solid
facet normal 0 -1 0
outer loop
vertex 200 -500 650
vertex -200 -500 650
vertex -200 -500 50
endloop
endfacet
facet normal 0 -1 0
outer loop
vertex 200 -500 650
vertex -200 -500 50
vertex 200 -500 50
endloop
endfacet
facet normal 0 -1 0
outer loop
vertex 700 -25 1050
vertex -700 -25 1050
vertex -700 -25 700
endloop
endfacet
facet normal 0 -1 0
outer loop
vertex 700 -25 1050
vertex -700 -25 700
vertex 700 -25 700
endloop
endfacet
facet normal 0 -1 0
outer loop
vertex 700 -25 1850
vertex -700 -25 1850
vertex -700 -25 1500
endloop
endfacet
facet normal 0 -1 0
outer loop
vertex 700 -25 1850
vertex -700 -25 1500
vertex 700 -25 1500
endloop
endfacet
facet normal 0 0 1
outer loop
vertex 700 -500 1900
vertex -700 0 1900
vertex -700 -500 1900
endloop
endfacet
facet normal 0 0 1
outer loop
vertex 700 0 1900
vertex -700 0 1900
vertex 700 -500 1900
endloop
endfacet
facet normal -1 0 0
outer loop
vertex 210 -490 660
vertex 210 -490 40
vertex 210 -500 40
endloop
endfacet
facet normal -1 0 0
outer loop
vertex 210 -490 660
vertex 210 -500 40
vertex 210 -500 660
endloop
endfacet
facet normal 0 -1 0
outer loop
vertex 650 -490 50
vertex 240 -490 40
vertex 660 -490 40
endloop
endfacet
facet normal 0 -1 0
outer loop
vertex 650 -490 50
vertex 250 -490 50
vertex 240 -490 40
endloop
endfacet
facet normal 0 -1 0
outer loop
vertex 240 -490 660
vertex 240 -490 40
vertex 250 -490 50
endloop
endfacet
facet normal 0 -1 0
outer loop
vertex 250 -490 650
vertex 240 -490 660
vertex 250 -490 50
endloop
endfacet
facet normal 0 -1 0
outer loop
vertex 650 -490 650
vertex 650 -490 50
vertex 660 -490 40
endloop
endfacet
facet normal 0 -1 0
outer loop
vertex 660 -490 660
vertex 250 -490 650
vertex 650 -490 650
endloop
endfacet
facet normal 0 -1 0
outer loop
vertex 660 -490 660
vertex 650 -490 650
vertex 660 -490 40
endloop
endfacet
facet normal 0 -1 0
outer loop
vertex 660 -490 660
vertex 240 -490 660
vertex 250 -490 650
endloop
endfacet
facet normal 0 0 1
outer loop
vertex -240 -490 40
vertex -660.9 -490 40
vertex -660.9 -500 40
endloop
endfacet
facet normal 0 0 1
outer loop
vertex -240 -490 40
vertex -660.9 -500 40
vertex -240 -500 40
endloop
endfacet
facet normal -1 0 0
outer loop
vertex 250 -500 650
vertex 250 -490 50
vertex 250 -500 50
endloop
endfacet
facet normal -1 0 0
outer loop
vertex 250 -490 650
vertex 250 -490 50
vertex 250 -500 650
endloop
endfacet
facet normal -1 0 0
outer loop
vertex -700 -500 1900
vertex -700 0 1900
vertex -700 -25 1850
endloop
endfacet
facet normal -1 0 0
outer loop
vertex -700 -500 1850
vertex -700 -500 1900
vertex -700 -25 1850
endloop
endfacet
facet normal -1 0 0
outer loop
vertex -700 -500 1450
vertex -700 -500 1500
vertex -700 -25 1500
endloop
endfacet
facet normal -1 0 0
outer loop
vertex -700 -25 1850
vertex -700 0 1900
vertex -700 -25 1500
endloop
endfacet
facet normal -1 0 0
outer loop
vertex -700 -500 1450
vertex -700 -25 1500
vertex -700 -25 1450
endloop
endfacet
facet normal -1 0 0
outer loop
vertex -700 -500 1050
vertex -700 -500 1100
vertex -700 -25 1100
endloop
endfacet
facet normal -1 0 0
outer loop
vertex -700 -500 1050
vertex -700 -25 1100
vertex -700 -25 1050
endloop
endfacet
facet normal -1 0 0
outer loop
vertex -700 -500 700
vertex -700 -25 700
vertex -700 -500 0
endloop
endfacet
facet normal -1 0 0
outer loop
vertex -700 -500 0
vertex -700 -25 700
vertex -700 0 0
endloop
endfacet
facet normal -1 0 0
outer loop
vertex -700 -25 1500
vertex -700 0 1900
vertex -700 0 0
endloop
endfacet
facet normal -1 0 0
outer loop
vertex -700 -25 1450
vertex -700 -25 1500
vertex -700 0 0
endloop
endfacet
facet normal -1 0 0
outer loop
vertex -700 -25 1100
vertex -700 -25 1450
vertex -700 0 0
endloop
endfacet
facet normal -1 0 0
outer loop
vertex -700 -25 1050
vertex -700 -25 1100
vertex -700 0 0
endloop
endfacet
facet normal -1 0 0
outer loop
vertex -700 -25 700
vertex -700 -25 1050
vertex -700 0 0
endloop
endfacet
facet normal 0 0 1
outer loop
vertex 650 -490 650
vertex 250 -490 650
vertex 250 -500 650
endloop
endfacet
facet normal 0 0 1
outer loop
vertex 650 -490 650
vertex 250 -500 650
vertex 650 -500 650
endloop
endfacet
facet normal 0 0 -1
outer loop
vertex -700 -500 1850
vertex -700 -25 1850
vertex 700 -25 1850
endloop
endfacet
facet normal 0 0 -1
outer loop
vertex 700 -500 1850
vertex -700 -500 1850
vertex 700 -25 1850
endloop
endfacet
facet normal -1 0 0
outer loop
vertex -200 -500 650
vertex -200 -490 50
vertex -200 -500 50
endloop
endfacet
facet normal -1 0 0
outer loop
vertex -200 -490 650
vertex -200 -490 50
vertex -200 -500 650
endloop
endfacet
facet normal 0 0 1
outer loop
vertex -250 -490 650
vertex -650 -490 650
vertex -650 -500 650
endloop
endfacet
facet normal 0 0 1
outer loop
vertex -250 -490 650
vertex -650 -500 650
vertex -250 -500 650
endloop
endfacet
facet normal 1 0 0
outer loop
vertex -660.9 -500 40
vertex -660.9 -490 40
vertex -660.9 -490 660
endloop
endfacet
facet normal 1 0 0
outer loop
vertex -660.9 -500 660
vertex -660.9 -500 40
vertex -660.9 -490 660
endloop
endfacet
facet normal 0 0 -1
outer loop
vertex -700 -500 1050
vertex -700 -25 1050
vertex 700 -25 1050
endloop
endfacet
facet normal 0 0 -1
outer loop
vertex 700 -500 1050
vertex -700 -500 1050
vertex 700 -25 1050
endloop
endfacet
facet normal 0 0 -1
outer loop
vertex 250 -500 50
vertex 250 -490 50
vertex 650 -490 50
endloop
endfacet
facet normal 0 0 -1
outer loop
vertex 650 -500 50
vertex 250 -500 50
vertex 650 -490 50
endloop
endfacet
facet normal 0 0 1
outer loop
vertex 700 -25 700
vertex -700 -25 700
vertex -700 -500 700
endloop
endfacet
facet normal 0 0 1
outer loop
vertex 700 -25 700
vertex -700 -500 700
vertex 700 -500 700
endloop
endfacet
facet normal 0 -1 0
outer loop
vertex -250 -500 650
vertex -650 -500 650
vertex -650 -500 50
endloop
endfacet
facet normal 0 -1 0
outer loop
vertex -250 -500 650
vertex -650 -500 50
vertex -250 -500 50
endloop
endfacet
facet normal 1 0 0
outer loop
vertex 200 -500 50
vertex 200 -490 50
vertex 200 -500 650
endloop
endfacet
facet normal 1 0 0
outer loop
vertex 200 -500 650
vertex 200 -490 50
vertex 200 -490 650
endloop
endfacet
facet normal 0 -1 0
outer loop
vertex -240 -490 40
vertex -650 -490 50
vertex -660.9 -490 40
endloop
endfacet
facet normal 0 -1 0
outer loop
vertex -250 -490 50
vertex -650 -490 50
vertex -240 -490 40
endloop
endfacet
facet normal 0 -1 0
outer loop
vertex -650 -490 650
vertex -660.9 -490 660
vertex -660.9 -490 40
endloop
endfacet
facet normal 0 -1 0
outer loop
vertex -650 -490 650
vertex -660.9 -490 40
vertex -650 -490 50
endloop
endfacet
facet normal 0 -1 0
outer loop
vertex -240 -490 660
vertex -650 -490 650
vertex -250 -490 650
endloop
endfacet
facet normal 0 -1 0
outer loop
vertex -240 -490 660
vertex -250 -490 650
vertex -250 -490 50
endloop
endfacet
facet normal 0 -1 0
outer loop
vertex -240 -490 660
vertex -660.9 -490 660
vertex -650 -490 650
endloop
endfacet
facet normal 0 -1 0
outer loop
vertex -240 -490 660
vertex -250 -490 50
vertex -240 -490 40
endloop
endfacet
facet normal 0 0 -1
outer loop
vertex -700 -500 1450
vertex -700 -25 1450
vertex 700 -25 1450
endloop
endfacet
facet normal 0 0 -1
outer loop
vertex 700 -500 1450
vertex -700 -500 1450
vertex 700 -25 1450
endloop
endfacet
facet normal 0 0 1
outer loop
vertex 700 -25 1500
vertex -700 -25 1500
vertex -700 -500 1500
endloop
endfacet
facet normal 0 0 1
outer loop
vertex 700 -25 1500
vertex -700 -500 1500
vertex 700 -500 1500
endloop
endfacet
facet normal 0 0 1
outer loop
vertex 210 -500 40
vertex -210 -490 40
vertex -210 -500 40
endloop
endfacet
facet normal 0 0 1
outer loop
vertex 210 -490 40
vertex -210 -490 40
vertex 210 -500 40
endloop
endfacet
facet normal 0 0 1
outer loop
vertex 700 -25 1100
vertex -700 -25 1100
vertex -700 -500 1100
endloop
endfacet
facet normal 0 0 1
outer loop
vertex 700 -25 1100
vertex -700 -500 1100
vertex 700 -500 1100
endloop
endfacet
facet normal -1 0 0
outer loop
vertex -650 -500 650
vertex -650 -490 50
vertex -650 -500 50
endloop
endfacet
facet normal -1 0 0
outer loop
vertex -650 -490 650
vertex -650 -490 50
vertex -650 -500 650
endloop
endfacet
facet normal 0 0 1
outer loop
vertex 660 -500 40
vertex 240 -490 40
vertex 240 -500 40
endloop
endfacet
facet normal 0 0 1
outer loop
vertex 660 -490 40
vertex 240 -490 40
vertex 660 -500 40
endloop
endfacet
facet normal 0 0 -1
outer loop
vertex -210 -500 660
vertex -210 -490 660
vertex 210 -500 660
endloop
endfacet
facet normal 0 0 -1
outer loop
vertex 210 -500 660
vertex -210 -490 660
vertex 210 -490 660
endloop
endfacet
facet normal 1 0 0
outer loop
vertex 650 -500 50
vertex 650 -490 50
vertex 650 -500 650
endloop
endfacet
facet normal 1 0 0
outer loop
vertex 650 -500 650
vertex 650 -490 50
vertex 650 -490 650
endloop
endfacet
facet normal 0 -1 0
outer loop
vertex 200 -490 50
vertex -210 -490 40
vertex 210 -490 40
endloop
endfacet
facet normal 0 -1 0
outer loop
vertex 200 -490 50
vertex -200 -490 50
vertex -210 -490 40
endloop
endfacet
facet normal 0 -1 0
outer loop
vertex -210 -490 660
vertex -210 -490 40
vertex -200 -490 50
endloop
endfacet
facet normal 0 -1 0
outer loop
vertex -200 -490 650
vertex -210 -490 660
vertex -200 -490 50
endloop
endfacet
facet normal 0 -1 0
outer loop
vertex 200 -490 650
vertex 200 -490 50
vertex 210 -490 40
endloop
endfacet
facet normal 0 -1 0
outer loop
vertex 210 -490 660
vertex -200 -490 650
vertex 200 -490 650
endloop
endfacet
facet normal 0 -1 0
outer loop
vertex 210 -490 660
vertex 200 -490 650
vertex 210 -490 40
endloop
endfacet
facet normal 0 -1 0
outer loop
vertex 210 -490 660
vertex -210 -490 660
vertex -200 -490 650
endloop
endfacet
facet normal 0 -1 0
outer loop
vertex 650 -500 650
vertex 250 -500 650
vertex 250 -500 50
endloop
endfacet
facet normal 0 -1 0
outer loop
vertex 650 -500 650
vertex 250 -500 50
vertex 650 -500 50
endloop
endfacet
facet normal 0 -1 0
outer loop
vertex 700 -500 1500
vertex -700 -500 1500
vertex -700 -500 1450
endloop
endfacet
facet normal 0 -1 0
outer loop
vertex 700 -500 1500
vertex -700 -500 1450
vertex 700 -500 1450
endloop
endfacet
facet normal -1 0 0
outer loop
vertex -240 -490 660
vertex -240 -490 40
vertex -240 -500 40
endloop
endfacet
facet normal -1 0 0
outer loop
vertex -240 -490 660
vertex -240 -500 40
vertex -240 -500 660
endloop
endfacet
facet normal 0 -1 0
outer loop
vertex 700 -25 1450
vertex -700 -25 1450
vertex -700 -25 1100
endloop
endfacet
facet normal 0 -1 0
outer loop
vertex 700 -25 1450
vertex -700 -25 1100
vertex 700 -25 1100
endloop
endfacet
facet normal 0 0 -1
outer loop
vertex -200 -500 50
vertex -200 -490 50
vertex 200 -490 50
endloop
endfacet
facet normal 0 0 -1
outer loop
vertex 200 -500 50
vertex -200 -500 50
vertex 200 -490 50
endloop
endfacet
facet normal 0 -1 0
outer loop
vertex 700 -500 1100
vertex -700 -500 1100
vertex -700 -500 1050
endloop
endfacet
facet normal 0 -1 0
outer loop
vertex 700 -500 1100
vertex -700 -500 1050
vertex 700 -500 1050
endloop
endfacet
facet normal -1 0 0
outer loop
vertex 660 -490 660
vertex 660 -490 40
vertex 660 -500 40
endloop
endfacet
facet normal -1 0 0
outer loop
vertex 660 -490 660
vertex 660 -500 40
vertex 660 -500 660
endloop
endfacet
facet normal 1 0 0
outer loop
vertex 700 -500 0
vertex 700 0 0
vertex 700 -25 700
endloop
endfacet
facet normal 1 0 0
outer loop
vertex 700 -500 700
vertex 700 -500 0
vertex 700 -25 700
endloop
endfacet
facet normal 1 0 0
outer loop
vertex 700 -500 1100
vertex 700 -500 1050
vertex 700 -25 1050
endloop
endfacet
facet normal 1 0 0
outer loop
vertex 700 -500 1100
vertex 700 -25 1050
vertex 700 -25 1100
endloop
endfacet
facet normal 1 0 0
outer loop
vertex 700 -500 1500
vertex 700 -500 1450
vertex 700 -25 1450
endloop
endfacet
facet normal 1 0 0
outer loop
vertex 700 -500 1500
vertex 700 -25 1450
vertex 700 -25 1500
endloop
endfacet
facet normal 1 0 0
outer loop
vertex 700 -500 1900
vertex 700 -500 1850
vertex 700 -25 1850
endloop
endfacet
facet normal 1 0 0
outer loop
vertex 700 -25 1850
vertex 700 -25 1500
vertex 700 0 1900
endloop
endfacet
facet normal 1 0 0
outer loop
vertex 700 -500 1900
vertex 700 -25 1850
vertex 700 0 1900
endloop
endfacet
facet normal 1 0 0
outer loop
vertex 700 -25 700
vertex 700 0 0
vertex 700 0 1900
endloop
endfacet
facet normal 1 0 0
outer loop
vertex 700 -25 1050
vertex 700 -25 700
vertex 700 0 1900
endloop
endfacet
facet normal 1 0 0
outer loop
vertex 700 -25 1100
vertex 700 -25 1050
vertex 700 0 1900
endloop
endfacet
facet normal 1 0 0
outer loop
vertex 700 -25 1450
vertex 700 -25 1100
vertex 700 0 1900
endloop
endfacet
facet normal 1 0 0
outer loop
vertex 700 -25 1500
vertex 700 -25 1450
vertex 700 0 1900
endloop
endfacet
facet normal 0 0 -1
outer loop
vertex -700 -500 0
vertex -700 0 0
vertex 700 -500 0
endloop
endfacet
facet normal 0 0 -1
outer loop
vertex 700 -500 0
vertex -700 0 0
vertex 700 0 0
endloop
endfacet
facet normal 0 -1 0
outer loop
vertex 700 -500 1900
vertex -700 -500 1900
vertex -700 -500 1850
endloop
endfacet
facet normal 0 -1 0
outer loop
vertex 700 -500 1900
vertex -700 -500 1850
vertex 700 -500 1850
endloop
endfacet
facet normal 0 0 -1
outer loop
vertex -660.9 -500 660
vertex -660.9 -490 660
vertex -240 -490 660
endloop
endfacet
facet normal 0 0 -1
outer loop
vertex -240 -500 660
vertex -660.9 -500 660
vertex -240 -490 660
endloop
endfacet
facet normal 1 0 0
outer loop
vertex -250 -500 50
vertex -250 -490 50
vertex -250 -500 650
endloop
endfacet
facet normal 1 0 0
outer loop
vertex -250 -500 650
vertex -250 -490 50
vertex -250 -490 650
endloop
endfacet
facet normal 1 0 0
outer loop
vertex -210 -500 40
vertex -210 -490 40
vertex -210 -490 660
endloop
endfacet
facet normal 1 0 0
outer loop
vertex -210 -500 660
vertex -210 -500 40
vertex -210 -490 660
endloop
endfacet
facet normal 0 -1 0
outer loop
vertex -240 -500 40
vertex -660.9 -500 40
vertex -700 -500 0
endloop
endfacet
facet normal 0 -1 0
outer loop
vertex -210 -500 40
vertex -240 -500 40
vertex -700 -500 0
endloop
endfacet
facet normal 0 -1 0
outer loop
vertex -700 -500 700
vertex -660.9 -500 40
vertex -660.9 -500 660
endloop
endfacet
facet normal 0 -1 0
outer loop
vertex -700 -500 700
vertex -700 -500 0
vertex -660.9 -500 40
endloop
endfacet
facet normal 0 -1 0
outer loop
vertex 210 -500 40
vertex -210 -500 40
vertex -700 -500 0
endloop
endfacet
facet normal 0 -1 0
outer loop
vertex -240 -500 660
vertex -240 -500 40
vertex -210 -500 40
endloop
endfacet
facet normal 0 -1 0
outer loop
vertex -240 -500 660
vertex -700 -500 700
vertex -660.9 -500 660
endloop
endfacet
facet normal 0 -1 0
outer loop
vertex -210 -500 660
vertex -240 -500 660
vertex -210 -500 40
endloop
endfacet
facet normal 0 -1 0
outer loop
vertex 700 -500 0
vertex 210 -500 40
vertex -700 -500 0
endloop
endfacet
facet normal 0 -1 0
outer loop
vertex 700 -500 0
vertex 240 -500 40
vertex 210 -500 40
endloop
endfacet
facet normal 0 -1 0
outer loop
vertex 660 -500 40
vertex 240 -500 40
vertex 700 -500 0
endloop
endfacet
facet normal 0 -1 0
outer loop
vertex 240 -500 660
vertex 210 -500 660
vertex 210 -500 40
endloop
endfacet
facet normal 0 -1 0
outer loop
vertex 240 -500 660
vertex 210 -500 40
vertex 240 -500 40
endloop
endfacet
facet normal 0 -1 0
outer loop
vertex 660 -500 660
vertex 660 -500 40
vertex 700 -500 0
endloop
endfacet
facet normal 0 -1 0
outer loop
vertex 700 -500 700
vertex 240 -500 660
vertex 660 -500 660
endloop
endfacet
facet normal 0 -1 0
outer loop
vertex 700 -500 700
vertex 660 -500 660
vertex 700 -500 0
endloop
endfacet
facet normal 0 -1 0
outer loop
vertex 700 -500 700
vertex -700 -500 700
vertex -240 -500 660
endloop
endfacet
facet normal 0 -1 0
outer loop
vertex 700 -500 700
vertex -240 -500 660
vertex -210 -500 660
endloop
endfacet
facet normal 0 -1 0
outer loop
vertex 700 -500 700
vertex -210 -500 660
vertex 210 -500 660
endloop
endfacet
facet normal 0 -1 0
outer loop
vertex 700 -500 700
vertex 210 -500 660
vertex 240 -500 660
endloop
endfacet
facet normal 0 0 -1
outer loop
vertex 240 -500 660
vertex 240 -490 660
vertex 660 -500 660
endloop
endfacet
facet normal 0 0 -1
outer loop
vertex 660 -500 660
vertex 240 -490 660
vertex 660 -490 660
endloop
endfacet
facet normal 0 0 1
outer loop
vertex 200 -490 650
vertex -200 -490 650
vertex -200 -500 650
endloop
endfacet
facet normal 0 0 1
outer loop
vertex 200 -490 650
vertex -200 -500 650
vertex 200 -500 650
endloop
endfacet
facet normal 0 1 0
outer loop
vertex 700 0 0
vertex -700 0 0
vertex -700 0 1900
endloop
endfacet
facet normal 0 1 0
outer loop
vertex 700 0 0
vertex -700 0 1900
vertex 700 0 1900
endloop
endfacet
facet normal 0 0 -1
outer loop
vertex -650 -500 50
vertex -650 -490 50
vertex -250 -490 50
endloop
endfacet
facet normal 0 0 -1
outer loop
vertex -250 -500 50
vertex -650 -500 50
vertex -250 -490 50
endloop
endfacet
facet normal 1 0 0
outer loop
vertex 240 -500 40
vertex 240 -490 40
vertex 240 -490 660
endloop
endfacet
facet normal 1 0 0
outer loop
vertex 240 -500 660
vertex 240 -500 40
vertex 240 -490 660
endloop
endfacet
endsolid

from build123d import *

# Parameters (mm, degrees)
F0_W     = 1400
F0_H     = 700
F0_W_2   = 420.8995199203
F0_H_2   = 620
F0_W_3   = 420
F0_H_3   = 350
F0_W_4   = 400
F0_H_4   = 600
F0_H_5   = 50
F1_DEPTH = 25
F2_DEPTH = 500
F3_START = 490
F3_DEPTH = 10


with BuildPart() as f1:
    # F0 (on Front) → F1 (new body)
    with BuildSketch(Plane.XZ):
        with Locations((0, 350)):
            Rectangle(F0_W, F0_H)
        with Locations((-450.4497599602, 350)):
            Rectangle(F0_W_2, F0_H_2, mode=Mode.SUBTRACT)
        with Locations((0, 350)):
            Rectangle(F0_W_3, F0_H_2, mode=Mode.SUBTRACT)
        with Locations((450, 350)):
            Rectangle(F0_W_3, F0_H_2, mode=Mode.SUBTRACT)
        with Locations((0, 875)):
            Rectangle(F0_W, F0_H_3)
        with Locations((0, 1275)):
            Rectangle(F0_W, F0_H_3)
        with Locations((0, 1675)):
            Rectangle(F0_W, F0_H_3)
        with Locations((-450.4497599602, 350)):
            Rectangle(F0_W_2, F0_H_2)
        with Locations((-450, 350)):
            Rectangle(F0_W_4, F0_H_4, mode=Mode.SUBTRACT)
        with Locations((450, 350)):
            Rectangle(F0_W_3, F0_H_2)
        with Locations((450, 350)):
            Rectangle(F0_W_4, F0_H_4, mode=Mode.SUBTRACT)
        with Locations((0, 350)):
            Rectangle(F0_W_3, F0_H_2)
        with Locations((0, 350)):
            Rectangle(F0_W_4, F0_H_4, mode=Mode.SUBTRACT)
        with Locations((450, 350)):
            Rectangle(F0_W_4, F0_H_4)
        with Locations((0, 350)):
            Rectangle(F0_W_4, F0_H_4)
        with Locations((-450, 350)):
            Rectangle(F0_W_4, F0_H_4)
        with Locations((0, 1075)):
            Rectangle(F0_W, F0_H_5)
        with Locations((0, 1475)):
            Rectangle(F0_W, F0_H_5)
        with Locations((0, 1875)):
            Rectangle(F0_W, F0_H_5)
    extrude(amount=F1_DEPTH)

    # F0 (on Front) → F2 (join)
    with BuildSketch(Plane.XZ):
        with Locations((0, 350)):
            Rectangle(F0_W, F0_H)
        with Locations((-450.4497599602, 350)):
            Rectangle(F0_W_2, F0_H_2, mode=Mode.SUBTRACT)
        with Locations((0, 350)):
            Rectangle(F0_W_3, F0_H_2, mode=Mode.SUBTRACT)
        with Locations((450, 350)):
            Rectangle(F0_W_3, F0_H_2, mode=Mode.SUBTRACT)
        with Locations((-450.4497599602, 350)):
            Rectangle(F0_W_2, F0_H_2)
        with Locations((-450, 350)):
            Rectangle(F0_W_4, F0_H_4, mode=Mode.SUBTRACT)
        with Locations((450, 350)):
            Rectangle(F0_W_3, F0_H_2)
        with Locations((450, 350)):
            Rectangle(F0_W_4, F0_H_4, mode=Mode.SUBTRACT)
        with Locations((0, 350)):
            Rectangle(F0_W_3, F0_H_2)
        with Locations((0, 350)):
            Rectangle(F0_W_4, F0_H_4, mode=Mode.SUBTRACT)
        with Locations((-450, 350)):
            Rectangle(F0_W_4, F0_H_4)
        with Locations((0, 350)):
            Rectangle(F0_W_4, F0_H_4)
        with Locations((450, 350)):
            Rectangle(F0_W_4, F0_H_4)
        with Locations((0, 1875)):
            Rectangle(F0_W, F0_H_5)
        with Locations((0, 1475)):
            Rectangle(F0_W, F0_H_5)
        with Locations((0, 1075)):
            Rectangle(F0_W, F0_H_5)
    extrude(amount=F2_DEPTH)

    # F0 (on Front) → F3 (cut)
    with BuildSketch(Plane.XZ.offset(F3_START)):
        with Locations((450, 350)):
            Rectangle(F0_W_3, F0_H_2)
        with Locations((450, 350)):
            Rectangle(F0_W_4, F0_H_4, mode=Mode.SUBTRACT)
        with Locations((0, 350)):
            Rectangle(F0_W_3, F0_H_2)
        with Locations((0, 350)):
            Rectangle(F0_W_4, F0_H_4, mode=Mode.SUBTRACT)
        with Locations((-450.4497599602, 350)):
            Rectangle(F0_W_2, F0_H_2)
        with Locations((-450, 350)):
            Rectangle(F0_W_4, F0_H_4, mode=Mode.SUBTRACT)
    extrude(amount=F3_DEPTH, mode=Mode.SUBTRACT)


solid = f1.part
